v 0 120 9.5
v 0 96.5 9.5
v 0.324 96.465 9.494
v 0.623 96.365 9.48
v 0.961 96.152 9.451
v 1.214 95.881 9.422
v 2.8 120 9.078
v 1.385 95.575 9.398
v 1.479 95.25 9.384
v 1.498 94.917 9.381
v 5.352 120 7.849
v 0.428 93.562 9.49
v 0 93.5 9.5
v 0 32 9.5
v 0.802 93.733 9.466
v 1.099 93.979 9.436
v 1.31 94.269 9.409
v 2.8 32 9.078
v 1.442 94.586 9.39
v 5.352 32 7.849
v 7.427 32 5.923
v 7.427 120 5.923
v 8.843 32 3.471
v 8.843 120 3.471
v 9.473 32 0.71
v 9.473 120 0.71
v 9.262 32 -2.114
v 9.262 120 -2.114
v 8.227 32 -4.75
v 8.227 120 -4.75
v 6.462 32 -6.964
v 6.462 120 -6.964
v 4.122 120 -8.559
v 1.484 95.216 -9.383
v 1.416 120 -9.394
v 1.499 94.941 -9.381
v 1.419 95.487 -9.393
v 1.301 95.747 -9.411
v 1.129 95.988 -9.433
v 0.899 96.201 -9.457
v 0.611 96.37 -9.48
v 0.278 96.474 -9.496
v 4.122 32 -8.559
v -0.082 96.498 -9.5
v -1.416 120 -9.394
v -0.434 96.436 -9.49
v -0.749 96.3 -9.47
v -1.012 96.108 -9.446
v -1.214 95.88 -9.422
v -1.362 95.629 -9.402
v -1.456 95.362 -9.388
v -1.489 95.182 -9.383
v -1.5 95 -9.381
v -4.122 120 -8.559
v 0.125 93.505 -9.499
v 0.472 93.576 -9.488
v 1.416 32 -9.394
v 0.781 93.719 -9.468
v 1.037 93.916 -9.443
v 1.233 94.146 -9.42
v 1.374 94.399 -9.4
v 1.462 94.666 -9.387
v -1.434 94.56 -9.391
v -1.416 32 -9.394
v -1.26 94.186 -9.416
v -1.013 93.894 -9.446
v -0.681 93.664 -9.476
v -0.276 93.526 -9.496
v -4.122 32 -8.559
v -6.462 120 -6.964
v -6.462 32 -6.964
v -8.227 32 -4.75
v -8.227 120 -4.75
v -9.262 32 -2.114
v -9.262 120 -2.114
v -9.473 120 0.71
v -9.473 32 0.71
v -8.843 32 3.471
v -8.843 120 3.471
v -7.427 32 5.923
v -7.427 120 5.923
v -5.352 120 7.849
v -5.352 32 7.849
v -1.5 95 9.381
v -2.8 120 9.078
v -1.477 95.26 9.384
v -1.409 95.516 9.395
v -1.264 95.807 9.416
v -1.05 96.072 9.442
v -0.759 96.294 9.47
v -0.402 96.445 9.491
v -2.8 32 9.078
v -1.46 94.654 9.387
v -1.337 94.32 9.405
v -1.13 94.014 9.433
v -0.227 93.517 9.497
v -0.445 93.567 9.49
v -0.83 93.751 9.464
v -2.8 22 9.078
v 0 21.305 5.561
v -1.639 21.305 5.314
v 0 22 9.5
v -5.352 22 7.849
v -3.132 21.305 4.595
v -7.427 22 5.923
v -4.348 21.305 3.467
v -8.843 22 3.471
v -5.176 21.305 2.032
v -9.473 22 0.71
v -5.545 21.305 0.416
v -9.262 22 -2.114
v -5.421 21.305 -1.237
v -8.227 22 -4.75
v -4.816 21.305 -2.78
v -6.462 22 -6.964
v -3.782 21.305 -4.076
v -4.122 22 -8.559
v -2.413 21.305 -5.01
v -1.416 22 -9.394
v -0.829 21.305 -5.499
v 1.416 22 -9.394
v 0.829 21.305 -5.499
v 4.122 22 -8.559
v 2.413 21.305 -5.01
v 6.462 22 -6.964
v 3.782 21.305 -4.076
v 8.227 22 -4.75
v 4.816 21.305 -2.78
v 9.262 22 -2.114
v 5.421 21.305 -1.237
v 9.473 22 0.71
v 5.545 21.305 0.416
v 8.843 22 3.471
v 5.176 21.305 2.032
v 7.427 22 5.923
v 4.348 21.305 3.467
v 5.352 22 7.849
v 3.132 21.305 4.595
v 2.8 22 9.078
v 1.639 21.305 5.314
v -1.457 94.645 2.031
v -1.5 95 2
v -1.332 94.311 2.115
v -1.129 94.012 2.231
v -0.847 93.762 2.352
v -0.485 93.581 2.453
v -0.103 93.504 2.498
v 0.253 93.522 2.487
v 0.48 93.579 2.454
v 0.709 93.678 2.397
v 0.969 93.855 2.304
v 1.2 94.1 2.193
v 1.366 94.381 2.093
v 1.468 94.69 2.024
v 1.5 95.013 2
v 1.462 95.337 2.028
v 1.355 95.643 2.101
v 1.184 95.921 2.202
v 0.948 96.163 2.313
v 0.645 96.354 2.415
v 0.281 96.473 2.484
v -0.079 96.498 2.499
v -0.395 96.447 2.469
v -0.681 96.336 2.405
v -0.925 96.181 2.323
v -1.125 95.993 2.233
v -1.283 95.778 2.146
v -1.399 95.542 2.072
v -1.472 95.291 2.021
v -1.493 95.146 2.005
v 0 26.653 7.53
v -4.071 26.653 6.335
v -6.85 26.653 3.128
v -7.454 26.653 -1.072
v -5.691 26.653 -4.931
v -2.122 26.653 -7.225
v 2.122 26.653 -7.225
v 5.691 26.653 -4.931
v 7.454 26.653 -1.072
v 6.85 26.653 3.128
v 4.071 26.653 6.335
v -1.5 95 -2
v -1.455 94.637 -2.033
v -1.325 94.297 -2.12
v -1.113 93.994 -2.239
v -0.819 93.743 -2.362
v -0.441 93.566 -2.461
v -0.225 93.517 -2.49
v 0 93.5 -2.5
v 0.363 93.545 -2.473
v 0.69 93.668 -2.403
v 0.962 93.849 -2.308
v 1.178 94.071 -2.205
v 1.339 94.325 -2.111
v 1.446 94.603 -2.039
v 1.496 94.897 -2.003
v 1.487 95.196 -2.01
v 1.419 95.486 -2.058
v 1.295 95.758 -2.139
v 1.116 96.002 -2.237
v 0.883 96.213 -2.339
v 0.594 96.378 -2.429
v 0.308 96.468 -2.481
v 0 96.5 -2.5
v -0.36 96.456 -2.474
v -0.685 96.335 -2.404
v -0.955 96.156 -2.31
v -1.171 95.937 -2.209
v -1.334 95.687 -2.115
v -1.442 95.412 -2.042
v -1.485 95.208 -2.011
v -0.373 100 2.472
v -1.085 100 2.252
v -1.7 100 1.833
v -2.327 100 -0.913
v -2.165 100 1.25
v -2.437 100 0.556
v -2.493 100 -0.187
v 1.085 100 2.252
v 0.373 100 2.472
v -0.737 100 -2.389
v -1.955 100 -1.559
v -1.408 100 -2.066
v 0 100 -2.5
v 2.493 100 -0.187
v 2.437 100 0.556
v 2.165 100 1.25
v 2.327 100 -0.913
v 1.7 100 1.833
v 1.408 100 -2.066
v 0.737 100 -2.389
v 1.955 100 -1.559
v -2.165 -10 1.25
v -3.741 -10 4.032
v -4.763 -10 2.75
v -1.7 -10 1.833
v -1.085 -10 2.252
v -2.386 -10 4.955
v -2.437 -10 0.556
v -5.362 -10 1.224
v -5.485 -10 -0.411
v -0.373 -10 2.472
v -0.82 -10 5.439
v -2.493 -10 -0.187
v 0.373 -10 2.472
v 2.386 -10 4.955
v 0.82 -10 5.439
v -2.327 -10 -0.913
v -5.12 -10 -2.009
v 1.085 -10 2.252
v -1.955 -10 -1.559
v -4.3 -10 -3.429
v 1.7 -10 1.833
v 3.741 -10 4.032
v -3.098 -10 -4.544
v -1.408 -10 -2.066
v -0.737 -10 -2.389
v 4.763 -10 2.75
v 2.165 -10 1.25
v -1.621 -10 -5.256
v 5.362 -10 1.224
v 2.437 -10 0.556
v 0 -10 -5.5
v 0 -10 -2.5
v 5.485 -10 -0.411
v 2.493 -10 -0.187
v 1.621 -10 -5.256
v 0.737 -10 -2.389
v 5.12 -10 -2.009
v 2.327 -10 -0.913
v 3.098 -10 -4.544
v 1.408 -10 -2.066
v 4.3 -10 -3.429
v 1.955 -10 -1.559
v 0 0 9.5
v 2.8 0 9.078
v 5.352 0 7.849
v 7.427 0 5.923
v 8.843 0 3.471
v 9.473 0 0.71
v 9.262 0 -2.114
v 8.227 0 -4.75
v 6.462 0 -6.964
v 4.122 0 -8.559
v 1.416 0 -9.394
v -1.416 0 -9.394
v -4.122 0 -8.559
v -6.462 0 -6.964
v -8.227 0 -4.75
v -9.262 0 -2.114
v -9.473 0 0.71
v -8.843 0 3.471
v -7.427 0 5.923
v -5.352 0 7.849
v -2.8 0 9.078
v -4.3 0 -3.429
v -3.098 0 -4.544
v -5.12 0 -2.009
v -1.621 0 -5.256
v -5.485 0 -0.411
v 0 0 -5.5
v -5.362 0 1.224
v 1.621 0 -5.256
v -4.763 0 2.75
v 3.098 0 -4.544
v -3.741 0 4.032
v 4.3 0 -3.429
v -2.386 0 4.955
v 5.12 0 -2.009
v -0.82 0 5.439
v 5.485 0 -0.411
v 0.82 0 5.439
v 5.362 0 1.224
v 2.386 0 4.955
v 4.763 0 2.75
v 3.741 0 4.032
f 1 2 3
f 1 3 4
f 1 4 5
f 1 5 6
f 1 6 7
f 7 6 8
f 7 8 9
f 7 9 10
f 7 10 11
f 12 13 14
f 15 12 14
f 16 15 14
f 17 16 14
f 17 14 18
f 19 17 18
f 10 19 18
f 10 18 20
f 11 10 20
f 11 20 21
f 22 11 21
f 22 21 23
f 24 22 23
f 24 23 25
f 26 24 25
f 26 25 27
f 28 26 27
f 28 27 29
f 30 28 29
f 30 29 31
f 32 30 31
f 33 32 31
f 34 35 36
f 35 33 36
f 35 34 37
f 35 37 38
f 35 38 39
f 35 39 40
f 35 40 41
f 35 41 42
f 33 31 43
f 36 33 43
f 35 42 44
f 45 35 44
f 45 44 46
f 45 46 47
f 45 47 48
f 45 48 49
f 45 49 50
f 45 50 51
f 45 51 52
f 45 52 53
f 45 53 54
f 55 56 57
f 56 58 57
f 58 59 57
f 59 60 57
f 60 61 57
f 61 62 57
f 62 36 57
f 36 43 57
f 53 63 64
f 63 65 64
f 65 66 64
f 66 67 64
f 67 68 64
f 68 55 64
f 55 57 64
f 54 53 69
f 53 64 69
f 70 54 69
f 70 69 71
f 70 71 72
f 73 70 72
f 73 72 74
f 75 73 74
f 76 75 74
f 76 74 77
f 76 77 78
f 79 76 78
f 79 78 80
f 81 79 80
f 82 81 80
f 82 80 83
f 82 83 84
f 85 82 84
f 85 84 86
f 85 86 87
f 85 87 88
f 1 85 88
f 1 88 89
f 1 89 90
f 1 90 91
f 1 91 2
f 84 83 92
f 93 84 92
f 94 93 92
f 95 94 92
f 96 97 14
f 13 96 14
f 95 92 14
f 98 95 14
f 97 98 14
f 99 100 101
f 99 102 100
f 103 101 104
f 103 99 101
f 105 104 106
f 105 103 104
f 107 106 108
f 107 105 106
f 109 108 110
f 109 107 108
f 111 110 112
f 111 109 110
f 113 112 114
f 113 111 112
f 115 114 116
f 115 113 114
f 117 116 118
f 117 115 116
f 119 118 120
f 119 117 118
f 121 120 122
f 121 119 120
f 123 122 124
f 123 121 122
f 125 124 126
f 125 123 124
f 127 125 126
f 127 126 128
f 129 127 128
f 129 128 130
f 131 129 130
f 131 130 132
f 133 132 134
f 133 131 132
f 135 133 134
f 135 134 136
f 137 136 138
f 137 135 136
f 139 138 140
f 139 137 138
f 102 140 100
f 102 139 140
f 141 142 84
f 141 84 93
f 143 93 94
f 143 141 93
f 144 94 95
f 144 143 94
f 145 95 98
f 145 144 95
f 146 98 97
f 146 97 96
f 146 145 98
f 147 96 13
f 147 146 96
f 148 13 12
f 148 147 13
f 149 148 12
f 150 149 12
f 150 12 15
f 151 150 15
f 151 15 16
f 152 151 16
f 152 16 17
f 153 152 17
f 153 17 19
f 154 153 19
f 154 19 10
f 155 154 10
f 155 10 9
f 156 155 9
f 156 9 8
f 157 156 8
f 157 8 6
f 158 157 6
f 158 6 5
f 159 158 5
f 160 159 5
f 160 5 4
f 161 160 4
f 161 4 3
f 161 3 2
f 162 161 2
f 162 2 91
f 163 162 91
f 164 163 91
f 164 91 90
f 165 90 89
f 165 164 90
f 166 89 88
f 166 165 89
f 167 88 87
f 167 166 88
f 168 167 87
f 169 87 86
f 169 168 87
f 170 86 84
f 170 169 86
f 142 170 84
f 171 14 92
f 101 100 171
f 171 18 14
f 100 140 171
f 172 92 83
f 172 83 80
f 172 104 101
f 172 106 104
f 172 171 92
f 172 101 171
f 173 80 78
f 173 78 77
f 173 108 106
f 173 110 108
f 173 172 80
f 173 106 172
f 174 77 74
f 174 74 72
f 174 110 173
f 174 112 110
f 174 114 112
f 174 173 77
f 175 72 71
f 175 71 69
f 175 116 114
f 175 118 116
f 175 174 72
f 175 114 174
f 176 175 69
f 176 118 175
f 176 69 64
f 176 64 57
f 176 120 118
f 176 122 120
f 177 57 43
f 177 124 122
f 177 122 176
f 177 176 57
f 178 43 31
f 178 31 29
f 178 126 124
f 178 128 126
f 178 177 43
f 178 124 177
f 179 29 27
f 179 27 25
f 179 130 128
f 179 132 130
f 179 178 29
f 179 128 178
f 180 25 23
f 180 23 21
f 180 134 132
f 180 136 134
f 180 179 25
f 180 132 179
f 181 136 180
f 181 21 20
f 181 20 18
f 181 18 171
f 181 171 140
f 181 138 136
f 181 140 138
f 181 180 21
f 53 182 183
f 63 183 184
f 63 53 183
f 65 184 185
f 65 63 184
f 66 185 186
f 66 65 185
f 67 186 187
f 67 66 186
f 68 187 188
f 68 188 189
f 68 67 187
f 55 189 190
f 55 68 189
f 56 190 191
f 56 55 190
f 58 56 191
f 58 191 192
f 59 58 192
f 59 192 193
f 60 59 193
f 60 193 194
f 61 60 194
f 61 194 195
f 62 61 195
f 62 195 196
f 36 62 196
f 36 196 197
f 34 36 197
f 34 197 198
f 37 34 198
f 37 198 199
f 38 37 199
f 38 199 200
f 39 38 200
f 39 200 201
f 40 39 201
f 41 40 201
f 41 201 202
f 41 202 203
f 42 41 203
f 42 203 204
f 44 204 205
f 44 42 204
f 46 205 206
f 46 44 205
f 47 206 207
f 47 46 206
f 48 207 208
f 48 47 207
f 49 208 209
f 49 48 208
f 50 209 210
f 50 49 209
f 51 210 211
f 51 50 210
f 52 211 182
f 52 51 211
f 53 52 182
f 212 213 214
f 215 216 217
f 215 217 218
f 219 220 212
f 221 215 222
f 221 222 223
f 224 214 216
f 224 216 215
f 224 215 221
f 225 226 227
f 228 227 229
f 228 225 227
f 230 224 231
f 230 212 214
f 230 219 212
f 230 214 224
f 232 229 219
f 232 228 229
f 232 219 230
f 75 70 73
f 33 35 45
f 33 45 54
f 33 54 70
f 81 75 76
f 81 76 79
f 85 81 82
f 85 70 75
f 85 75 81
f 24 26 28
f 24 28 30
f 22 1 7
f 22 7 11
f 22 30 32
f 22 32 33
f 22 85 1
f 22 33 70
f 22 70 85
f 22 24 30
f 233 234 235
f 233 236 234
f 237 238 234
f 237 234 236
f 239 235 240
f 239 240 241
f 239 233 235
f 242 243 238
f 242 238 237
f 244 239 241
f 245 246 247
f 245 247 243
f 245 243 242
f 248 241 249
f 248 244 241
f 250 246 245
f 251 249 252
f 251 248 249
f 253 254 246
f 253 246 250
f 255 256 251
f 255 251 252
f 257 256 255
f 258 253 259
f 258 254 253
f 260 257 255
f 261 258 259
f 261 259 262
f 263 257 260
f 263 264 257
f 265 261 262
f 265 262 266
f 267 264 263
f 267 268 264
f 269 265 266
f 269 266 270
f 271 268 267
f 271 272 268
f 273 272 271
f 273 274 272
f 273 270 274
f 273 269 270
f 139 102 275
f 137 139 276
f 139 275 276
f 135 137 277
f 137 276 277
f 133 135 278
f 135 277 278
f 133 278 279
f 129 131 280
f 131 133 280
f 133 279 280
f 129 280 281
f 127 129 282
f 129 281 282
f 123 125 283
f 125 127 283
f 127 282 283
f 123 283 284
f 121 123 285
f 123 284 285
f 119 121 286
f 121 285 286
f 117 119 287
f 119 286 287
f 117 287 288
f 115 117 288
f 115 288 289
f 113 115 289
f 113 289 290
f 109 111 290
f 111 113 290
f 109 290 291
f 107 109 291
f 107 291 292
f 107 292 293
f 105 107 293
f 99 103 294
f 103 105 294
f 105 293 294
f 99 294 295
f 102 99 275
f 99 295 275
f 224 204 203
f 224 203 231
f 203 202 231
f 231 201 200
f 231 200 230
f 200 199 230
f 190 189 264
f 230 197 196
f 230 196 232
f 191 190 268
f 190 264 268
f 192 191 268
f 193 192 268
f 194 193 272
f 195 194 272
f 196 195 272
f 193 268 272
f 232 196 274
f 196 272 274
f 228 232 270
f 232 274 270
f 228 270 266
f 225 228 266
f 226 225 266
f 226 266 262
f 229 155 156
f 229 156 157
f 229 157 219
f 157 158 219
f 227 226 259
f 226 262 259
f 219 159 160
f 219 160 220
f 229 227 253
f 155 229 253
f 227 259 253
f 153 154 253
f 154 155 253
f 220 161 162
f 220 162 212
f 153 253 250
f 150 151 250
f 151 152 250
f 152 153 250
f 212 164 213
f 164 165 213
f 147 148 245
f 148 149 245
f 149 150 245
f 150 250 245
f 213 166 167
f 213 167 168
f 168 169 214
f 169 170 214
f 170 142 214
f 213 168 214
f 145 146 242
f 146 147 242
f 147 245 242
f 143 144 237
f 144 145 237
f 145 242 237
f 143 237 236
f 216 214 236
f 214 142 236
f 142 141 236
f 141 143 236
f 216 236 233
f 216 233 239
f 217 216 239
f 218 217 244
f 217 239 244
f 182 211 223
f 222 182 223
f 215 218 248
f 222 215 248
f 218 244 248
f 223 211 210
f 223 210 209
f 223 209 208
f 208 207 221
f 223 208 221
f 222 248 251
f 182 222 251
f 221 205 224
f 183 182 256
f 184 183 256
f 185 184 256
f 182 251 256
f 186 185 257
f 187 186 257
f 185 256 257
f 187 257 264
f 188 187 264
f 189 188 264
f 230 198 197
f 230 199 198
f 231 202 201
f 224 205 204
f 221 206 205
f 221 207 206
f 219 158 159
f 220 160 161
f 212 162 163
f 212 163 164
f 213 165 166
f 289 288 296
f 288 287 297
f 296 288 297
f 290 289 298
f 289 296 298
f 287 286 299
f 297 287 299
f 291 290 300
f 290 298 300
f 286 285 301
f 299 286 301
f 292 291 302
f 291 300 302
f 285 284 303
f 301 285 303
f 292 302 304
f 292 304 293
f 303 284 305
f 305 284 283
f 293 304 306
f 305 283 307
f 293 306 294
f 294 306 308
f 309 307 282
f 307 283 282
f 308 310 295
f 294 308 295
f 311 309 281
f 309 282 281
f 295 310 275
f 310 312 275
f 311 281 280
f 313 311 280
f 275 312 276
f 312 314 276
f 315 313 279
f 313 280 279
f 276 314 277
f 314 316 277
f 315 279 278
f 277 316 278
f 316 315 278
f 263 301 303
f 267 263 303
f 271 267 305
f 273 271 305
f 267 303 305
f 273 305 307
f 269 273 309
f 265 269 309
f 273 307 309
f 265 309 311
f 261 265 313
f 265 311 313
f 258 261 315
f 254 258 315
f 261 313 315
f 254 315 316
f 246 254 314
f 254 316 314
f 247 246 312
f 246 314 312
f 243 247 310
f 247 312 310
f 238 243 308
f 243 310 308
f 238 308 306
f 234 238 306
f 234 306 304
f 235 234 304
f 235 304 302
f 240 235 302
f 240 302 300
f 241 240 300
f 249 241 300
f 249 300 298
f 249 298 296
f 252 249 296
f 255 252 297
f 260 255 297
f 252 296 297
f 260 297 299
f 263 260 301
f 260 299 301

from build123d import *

# Parameters (mm, degrees)
CROQUIS1_R                 = 9.5
SALIENTE_EXTRUIR1_DEPTH    = 120
CROQUIS3_R                 = 5.5
SALIENTE_EXTRUIR2_DEPTH    = 10
CROQUIS4_R                 = 2.5
CORTAR_EXTRUIR1_DEPTH      = 110
CORTAR_EXTRUIR2_DEPTH      = 110
CORTAR_EXTRUIR2_DEPTH_BACK = 110
CROQUIS5_R                 = 1.5


with BuildPart() as part:
    # Croquis1 → Saliente-Extruir1 (new body)
    with BuildSketch(Plane(origin=(0, 0, 0), x_dir=(1, 0, 0), z_dir=(0, 1, 0))):
        Circle(CROQUIS1_R)
    extrude(amount=SALIENTE_EXTRUIR1_DEPTH)

    # Croquis2 → Cortar-Revolución1 (revolve, cut)
    with BuildSketch(Plane.XY):
        Polygon((-9.5, 22), (-9.5, 32), (-5.560768988, 21.305407289), align=None)
    revolve(axis=Axis((0, 120, 0), (0, -1, 0)), mode=Mode.SUBTRACT)

    # Croquis3 → Saliente-Extruir2 (add)
    with BuildSketch(Plane.XZ):
        Circle(CROQUIS3_R)
    extrude(amount=SALIENTE_EXTRUIR2_DEPTH)

    # Croquis4 → Cortar-Extruir1 (cut)
    with BuildSketch(Plane.XZ.offset(10)):
        Circle(CROQUIS4_R)
    extrude(amount=-CORTAR_EXTRUIR1_DEPTH, mode=Mode.SUBTRACT)

    # Croquis5 → Cortar-Extruir2 (cut, two sides: drawn at the far end of the back side and taken through both)
    with BuildSketch(Plane.XY.offset(-CORTAR_EXTRUIR2_DEPTH_BACK)):
        with Locations((0, 95)):
            Circle(CROQUIS5_R)
    extrude(amount=CORTAR_EXTRUIR2_DEPTH + CORTAR_EXTRUIR2_DEPTH_BACK, mode=Mode.SUBTRACT)


solid = part.part
